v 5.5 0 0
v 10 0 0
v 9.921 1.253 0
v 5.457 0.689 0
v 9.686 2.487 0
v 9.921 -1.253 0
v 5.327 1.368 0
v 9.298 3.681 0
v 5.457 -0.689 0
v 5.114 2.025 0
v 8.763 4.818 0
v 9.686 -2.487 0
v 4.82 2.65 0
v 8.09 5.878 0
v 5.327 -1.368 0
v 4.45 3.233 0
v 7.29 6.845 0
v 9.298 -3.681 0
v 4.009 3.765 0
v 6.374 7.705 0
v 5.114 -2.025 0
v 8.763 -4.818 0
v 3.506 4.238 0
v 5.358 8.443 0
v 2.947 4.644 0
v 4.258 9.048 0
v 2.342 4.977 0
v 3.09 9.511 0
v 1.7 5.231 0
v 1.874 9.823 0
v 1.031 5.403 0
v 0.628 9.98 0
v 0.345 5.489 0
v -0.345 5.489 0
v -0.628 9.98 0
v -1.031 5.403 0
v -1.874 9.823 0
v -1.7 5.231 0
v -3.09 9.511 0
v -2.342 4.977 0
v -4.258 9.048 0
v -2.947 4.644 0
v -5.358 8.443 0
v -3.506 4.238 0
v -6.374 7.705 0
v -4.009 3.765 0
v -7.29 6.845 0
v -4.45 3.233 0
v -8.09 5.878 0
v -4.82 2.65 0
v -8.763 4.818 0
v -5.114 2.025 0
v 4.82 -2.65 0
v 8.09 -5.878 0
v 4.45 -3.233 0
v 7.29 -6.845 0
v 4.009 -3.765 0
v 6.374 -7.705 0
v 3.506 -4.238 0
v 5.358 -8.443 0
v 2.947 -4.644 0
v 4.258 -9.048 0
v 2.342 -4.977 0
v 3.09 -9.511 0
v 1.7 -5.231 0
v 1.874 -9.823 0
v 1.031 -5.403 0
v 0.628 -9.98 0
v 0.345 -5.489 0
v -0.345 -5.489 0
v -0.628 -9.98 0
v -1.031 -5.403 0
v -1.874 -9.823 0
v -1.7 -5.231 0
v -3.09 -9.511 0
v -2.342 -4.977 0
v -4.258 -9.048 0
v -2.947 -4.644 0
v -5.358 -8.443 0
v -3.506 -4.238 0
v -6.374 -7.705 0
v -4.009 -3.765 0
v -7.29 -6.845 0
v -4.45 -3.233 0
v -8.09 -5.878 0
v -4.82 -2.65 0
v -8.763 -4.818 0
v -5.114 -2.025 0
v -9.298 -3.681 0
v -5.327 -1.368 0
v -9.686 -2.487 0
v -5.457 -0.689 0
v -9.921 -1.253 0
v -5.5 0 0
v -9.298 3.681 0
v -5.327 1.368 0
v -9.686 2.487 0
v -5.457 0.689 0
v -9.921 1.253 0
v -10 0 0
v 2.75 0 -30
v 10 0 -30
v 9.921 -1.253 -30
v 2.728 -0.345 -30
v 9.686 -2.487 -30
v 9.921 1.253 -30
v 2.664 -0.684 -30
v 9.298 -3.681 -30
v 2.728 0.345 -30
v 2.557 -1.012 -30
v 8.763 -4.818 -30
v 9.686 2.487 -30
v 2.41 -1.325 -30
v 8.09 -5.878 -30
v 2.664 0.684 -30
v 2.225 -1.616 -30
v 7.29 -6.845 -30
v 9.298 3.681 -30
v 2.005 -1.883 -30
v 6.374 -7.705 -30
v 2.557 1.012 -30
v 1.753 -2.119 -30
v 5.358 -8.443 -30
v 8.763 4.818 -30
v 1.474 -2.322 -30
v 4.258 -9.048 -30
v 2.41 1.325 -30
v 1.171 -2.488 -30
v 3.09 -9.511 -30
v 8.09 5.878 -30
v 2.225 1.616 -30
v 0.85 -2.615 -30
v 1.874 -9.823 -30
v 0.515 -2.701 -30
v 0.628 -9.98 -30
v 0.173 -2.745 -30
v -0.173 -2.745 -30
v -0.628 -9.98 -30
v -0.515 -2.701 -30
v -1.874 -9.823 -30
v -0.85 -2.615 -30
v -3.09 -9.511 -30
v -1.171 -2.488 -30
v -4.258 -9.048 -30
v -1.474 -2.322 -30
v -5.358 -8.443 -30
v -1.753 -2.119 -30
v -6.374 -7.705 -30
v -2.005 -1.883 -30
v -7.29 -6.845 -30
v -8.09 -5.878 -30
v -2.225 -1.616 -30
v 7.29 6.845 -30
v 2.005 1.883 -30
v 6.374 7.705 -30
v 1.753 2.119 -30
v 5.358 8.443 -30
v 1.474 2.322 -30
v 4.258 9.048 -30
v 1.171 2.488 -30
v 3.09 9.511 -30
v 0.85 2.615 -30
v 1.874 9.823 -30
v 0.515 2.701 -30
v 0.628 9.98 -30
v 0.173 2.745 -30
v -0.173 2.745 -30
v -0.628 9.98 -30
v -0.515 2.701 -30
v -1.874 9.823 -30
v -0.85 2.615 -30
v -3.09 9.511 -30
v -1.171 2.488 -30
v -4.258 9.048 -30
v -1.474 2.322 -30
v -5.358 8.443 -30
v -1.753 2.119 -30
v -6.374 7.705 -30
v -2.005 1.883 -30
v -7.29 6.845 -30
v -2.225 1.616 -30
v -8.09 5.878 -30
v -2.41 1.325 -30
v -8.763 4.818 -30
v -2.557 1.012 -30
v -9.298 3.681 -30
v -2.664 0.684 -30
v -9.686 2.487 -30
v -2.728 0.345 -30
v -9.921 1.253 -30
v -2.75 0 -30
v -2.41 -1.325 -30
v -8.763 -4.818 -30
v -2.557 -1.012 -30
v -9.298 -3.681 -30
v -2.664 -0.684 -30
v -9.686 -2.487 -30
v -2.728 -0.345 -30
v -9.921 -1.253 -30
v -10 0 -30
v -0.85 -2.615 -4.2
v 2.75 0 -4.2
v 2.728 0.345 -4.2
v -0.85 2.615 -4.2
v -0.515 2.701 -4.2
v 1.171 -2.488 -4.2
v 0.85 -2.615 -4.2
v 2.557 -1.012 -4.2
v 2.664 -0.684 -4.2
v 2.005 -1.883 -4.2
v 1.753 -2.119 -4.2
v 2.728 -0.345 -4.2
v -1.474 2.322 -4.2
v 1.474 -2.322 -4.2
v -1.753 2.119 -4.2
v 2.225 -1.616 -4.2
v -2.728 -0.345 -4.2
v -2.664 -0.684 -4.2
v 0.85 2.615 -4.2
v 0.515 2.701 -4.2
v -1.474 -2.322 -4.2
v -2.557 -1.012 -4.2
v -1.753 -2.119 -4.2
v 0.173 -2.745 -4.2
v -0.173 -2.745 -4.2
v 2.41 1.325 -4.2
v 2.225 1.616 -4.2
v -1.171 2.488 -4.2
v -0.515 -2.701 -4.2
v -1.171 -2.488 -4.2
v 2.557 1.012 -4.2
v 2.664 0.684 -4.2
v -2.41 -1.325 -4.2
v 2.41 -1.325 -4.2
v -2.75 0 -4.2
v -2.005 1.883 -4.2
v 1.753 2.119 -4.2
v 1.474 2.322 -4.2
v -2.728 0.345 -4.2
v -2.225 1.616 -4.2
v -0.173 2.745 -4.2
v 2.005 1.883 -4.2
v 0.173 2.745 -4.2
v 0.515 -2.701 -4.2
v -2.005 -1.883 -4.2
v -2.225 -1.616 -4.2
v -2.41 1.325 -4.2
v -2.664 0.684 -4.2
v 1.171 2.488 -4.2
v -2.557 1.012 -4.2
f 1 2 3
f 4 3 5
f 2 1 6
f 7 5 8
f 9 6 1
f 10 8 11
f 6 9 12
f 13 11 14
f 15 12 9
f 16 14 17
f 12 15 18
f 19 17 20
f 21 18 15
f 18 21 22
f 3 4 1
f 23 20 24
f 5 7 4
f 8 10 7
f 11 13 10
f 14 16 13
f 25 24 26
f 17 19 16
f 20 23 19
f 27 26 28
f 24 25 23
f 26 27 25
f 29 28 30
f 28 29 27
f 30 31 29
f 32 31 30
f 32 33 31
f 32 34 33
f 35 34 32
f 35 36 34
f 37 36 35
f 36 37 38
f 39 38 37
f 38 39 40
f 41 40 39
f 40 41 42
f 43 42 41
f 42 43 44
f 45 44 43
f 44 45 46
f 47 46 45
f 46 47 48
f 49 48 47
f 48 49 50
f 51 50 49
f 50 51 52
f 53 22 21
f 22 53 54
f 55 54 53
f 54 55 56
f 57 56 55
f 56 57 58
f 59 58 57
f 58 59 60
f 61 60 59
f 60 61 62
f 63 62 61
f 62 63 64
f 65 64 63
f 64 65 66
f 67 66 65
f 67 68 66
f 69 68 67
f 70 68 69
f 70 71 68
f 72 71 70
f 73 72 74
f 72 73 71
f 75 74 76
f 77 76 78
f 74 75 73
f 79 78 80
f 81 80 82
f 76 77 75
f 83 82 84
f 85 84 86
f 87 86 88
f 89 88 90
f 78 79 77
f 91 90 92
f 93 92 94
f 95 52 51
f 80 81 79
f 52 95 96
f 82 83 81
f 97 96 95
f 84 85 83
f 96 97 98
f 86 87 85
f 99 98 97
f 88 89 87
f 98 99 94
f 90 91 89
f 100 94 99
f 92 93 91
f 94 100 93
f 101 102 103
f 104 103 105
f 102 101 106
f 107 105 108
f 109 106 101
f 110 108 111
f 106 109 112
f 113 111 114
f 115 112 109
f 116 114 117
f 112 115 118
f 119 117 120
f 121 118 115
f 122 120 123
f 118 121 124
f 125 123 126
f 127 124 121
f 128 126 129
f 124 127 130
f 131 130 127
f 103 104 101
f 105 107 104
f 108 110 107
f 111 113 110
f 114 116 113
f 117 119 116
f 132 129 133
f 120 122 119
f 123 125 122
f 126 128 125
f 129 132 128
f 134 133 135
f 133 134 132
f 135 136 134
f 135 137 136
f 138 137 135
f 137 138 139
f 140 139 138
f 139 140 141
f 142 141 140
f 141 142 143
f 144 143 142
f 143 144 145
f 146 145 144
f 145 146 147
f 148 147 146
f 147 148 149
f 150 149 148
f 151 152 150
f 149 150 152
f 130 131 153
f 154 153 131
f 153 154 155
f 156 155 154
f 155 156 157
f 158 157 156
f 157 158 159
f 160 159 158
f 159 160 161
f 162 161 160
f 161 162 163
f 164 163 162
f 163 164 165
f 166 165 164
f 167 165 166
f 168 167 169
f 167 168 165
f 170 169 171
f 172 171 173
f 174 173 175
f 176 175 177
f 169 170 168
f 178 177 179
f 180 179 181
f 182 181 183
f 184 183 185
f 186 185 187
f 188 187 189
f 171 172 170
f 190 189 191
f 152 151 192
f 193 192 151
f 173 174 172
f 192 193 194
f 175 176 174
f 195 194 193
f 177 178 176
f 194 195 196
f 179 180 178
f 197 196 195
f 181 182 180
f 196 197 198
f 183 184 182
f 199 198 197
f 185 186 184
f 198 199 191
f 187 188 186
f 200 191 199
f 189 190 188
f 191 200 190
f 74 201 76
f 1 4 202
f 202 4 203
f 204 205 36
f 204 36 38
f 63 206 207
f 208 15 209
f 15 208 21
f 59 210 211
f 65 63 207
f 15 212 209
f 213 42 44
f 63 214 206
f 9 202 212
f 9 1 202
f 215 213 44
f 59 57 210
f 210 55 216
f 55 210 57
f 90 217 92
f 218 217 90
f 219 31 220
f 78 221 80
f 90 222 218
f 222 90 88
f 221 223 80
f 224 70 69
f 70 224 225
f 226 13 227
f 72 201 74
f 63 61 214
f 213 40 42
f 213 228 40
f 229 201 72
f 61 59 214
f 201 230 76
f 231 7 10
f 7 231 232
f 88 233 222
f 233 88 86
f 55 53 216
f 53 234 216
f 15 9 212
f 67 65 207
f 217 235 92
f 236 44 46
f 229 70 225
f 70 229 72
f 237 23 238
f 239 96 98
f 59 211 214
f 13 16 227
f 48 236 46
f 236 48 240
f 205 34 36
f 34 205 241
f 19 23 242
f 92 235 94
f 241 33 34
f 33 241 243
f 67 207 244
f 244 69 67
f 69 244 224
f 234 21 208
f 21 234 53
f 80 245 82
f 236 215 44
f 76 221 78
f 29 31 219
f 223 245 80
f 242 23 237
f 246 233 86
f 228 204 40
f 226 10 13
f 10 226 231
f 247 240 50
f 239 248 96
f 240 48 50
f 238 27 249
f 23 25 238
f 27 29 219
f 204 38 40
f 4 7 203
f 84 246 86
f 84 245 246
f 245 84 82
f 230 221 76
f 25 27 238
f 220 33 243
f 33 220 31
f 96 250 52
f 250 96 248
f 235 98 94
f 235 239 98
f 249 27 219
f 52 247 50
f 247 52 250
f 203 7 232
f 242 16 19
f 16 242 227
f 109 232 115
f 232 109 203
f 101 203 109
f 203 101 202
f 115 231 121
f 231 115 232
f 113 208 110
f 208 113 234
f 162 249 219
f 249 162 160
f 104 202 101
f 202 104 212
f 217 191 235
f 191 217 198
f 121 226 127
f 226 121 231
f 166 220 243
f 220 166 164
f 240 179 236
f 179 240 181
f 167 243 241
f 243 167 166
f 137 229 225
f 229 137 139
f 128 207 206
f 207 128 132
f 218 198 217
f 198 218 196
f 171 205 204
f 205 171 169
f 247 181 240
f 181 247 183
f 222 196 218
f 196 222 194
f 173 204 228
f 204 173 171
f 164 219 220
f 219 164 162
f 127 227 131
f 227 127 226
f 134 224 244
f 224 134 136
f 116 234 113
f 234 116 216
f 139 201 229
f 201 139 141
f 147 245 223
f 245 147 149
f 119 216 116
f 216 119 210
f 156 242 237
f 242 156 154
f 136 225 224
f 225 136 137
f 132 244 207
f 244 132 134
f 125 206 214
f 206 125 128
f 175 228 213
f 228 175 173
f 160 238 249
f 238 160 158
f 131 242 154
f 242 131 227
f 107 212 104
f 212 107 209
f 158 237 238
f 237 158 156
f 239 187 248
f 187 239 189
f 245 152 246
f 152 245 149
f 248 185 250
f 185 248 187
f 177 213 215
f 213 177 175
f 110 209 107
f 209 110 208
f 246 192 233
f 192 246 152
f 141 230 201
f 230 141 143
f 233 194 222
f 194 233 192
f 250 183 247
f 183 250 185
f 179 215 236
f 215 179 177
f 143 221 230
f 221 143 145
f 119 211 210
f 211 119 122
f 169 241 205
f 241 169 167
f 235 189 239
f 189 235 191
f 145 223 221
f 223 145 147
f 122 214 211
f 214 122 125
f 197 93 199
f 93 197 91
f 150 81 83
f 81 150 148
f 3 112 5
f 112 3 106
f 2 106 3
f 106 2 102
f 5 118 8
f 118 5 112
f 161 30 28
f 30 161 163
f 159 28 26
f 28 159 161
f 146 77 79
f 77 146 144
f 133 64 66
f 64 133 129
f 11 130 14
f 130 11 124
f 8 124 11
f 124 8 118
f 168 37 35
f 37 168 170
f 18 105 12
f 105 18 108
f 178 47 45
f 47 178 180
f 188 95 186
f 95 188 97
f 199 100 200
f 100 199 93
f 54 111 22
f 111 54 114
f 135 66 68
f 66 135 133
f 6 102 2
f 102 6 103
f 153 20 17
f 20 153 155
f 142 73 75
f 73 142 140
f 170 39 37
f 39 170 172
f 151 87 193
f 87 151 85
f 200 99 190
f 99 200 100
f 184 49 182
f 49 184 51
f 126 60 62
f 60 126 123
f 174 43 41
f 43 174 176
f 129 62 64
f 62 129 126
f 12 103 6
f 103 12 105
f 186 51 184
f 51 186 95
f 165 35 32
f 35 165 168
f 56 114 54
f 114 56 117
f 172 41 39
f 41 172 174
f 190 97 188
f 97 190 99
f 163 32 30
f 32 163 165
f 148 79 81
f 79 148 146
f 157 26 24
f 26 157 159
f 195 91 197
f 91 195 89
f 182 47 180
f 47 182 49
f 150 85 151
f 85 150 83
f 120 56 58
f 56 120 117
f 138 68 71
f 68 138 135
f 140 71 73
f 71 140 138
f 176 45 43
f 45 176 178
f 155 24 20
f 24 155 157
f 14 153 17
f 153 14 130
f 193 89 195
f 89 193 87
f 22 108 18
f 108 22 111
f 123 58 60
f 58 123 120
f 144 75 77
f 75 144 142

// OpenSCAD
$fn = 50;


difference() {
	union() {
		translate(v = [0, 0, -30.0000000000]) {
			cylinder(h = 30, r = 10.0000000000);
		}
		cylinder(h = 0, r = 20.0000000000);
	}
	union() {
		translate(v = [0, 0, 0]) {
			rotate(a = [0, 0, 0]) {
				difference() {
					union() {
						#translate(v = [0, 0, -30.0000000000]) {
							cylinder(h = 30, r = 2.2500000000);
						}
						#translate(v = [0, 0, -4.2000000000]) {
							cylinder(h = 4.2000000000, r = 10.0000000000, r1 = 2.7500000000, r2 = 5.5000000000);
						}
						#translate(v = [0, 0, -30.0000000000]) {
							cylinder(h = 30, r = 2.7500000000);
						}
						#translate(v = [0, 0, -30.0000000000]) {
							cylinder(h = 30, r = 2.2500000000);
						}
					}
					union();
				}
			}
		}
	}
}
